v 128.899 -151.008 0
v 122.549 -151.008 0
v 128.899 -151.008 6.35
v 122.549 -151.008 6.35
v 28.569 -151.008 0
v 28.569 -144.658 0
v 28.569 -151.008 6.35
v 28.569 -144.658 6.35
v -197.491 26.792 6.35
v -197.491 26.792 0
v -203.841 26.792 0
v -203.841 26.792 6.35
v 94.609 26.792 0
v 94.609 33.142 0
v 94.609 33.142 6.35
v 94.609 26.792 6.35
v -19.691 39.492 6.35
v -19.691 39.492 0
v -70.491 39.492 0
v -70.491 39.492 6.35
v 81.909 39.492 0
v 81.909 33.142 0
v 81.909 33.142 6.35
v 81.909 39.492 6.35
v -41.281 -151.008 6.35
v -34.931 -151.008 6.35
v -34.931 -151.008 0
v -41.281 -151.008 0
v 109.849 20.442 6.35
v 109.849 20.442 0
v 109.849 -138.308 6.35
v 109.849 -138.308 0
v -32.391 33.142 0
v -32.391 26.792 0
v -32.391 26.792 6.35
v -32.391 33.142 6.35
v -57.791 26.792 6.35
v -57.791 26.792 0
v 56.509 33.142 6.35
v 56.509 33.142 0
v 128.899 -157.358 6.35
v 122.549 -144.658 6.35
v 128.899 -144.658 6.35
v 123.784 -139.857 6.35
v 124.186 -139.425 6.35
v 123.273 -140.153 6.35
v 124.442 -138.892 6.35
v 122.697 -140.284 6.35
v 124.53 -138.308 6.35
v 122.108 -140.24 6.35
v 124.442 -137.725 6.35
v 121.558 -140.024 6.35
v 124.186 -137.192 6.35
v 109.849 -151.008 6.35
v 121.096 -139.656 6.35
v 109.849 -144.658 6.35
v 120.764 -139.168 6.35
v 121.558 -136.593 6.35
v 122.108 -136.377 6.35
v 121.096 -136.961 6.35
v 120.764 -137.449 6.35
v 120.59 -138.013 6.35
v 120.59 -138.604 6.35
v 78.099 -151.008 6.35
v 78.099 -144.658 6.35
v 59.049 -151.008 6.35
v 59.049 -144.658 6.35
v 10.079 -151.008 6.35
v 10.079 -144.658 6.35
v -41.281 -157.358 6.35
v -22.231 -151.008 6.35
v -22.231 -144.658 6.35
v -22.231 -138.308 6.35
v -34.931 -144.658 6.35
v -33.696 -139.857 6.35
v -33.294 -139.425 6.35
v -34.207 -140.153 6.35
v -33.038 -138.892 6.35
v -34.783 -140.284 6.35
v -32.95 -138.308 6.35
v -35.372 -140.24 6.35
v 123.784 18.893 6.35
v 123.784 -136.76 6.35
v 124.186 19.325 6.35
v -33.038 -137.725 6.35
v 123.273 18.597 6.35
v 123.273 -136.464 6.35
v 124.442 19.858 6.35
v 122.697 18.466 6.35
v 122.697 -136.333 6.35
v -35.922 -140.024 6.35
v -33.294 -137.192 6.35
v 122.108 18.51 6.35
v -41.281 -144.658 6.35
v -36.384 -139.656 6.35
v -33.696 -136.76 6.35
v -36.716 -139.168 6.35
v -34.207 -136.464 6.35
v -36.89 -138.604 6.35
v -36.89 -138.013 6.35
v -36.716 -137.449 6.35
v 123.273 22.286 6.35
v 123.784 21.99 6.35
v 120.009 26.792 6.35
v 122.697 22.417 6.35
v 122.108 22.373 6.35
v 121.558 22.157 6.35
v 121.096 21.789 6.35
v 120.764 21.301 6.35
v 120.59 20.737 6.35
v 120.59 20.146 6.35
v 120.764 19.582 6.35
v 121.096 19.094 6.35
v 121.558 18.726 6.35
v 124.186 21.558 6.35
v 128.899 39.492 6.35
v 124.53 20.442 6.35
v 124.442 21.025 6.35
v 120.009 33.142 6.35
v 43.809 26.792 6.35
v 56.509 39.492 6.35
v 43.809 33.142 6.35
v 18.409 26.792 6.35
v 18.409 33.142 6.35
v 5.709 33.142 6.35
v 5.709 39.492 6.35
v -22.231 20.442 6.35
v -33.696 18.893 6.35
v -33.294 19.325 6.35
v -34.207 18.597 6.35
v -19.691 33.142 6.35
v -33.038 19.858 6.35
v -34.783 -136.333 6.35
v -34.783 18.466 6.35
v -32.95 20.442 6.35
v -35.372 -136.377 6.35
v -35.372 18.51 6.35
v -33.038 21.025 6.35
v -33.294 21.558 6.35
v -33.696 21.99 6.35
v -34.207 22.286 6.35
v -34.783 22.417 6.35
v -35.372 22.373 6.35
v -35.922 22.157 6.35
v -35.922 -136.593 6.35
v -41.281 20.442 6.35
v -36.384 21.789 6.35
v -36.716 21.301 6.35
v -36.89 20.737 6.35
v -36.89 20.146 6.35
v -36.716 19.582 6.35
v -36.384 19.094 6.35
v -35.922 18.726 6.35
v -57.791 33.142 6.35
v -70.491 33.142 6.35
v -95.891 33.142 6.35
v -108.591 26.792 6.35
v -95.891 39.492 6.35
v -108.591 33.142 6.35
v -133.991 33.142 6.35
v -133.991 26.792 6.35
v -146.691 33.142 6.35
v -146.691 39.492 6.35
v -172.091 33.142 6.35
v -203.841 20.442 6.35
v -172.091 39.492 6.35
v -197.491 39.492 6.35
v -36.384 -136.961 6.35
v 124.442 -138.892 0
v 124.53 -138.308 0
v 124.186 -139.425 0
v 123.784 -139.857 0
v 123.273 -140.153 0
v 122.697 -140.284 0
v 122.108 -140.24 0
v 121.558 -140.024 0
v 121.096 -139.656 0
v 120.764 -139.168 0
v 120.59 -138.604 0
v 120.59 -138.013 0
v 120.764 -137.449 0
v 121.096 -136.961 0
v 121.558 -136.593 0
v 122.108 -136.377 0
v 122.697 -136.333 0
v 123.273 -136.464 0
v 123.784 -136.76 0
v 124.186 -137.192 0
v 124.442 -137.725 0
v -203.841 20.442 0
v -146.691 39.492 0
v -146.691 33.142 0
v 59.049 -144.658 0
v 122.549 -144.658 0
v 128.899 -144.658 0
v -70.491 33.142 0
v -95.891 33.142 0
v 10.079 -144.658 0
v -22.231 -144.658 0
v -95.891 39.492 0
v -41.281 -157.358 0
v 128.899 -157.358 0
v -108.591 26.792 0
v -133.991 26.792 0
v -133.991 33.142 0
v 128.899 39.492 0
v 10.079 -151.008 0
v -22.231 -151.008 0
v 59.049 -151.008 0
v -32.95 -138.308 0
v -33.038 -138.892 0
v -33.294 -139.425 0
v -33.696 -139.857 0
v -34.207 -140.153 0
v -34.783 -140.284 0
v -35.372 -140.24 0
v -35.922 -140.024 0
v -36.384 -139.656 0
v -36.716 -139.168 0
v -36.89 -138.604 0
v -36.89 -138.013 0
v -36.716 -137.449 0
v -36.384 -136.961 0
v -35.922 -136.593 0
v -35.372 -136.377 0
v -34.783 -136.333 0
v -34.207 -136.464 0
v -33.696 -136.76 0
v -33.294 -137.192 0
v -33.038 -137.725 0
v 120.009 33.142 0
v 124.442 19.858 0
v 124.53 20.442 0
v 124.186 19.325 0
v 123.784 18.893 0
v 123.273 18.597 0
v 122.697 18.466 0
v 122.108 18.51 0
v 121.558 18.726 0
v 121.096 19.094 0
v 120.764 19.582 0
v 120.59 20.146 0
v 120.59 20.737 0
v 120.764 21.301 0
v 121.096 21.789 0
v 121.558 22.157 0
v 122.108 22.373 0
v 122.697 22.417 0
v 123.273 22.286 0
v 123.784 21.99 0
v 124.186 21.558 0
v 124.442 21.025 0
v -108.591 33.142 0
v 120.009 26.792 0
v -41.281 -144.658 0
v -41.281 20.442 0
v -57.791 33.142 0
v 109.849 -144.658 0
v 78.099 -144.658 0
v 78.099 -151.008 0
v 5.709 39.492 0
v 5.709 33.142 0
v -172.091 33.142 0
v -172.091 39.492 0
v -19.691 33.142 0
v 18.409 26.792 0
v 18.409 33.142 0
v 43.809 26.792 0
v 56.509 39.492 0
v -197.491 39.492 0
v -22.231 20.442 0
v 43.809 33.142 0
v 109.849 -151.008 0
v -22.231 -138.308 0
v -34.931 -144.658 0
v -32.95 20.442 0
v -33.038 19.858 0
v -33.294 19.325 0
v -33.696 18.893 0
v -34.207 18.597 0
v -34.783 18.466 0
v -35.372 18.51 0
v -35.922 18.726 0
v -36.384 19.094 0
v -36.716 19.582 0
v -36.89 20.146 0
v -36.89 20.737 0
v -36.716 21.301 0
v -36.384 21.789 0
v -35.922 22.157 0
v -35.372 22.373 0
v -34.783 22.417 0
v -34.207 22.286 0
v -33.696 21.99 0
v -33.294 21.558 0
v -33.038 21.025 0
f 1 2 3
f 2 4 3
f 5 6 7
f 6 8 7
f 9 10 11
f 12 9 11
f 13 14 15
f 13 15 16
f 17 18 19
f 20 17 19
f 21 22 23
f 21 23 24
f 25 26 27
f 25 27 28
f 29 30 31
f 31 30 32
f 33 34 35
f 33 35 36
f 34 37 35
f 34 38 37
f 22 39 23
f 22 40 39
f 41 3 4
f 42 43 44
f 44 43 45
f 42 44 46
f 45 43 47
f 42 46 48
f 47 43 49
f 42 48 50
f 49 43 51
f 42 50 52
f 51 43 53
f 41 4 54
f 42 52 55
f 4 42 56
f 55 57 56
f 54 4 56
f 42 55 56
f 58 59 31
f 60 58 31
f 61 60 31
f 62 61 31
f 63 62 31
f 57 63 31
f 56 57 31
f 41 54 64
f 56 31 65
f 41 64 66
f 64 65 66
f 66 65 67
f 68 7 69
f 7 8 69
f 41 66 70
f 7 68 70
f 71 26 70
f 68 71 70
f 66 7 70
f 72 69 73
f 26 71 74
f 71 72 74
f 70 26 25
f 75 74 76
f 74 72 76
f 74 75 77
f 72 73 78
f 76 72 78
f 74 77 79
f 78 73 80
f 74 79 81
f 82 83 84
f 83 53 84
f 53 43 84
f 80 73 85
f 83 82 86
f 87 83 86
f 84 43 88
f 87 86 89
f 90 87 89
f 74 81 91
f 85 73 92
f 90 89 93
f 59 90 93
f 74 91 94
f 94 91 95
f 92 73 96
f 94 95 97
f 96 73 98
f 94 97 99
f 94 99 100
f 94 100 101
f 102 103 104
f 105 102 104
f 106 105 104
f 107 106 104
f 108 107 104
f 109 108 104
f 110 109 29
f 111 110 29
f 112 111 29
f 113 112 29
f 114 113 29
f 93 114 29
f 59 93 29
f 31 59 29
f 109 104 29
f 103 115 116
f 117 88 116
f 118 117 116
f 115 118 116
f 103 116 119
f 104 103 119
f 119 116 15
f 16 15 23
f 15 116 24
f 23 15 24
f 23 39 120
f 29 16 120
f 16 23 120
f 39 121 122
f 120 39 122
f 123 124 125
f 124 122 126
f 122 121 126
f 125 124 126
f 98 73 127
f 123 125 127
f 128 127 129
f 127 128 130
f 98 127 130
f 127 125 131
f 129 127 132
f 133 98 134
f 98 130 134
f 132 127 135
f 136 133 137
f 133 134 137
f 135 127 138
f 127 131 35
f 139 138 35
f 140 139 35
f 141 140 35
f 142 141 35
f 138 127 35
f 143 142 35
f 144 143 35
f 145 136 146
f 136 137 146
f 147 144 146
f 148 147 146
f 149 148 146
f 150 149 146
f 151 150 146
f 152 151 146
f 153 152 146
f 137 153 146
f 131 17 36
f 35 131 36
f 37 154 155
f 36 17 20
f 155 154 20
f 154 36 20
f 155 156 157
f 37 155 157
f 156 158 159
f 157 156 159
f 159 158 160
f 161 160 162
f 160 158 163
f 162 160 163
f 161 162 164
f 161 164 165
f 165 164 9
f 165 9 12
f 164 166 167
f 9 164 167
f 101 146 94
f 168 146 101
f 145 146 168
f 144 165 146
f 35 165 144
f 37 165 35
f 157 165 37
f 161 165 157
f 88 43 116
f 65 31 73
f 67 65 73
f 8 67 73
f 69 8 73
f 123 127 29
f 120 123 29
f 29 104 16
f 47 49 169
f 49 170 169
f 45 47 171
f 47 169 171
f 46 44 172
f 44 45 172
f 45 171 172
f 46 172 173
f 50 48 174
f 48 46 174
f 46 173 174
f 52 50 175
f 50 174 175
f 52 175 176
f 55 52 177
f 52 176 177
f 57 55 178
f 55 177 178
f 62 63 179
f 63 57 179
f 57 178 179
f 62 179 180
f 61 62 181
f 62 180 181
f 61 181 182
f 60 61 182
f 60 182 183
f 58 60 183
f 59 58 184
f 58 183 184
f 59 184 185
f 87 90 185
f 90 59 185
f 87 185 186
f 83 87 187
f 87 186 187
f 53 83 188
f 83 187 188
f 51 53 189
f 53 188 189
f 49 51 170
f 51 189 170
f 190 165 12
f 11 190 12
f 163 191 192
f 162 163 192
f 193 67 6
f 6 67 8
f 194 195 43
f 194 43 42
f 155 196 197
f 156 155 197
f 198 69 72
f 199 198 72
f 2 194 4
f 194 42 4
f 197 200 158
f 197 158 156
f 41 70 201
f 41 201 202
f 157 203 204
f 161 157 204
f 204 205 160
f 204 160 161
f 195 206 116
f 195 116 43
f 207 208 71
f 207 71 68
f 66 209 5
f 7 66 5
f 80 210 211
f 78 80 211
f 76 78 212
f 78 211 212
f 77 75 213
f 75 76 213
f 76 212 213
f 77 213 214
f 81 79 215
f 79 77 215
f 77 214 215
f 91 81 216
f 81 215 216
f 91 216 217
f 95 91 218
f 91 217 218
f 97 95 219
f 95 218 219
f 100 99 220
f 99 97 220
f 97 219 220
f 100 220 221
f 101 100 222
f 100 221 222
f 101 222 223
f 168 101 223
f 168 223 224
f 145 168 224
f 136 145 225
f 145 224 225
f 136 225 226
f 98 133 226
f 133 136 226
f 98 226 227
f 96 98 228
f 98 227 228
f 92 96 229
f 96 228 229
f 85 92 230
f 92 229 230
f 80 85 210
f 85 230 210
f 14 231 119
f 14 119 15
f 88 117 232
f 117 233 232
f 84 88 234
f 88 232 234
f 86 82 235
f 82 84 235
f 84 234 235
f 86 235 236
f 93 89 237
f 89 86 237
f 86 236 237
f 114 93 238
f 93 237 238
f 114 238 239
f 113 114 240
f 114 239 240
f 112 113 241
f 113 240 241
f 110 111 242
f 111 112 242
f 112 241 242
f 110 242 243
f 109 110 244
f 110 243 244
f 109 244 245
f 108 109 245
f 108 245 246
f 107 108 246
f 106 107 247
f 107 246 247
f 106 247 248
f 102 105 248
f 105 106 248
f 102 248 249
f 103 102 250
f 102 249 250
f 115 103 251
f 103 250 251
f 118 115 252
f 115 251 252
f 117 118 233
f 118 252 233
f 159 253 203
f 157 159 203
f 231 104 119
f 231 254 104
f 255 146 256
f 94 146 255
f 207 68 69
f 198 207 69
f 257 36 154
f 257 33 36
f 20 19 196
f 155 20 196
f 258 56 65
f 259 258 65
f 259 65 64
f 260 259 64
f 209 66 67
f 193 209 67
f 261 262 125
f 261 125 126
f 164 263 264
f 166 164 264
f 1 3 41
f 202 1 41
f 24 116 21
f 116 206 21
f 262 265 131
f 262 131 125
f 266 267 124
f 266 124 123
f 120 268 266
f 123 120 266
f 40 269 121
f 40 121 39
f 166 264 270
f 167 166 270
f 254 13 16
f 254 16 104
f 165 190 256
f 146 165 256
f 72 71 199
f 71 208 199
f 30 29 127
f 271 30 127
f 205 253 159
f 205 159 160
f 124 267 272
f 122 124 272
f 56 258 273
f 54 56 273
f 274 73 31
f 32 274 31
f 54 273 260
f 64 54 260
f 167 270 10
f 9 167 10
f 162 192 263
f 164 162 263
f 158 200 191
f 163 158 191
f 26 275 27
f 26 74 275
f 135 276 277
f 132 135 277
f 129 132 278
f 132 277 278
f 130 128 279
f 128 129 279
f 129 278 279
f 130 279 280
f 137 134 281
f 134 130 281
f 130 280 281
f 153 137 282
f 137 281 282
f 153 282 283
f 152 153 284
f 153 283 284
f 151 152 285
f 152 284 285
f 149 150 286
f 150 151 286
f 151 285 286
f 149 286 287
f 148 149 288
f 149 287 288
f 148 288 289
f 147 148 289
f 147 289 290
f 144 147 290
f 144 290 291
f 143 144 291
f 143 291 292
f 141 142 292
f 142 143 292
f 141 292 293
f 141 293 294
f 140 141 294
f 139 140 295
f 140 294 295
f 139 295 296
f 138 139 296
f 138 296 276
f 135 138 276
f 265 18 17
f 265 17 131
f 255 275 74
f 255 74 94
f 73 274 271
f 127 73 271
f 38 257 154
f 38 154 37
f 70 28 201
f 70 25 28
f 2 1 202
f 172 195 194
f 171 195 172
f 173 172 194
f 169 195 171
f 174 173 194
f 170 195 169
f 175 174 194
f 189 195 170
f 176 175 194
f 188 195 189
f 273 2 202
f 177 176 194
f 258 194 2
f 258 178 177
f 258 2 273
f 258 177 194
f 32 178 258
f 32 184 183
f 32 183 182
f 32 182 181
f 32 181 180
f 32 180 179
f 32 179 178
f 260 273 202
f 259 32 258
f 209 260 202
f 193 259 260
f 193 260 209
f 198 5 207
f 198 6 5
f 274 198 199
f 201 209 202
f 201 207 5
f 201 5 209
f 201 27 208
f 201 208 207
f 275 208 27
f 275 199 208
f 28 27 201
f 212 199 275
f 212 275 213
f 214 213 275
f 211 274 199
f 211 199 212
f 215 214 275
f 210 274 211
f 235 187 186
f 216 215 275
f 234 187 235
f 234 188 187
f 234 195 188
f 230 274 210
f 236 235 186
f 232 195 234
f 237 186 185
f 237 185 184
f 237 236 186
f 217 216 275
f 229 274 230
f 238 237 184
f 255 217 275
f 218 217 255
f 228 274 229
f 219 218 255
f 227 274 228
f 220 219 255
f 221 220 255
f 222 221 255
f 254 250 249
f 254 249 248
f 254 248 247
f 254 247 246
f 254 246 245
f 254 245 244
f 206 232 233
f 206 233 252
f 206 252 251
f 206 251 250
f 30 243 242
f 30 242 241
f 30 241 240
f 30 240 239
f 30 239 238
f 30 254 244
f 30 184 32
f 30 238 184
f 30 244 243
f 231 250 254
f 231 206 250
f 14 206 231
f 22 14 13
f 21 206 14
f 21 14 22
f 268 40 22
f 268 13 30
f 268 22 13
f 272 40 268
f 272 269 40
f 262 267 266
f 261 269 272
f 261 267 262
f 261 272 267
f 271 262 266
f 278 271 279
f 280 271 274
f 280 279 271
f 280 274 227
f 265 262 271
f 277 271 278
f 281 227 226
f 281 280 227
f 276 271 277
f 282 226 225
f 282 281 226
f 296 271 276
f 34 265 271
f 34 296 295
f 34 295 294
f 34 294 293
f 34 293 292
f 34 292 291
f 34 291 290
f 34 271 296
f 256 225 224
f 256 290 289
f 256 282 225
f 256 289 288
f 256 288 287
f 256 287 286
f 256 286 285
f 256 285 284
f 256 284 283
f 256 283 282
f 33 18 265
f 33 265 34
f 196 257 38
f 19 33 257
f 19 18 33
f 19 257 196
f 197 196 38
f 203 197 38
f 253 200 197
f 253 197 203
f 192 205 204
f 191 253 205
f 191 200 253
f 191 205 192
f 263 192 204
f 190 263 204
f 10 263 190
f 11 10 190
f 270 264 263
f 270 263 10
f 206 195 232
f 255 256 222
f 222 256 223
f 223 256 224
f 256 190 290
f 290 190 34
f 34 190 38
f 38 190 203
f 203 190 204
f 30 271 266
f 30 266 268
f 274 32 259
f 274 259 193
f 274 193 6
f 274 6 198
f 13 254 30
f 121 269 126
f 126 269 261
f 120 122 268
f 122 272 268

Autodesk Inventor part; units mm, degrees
ref_plane "YZ Plane" through (0, 0, 0) normal (1, 0, 0) x (0, 1, 0)
ref_plane "XZ Plane" through (0, 0, 0) normal (0, 1, 0) x (-1, 0, 0)
ref_plane "XY Plane" through (0, 0, 0) normal (0, 0, 1) x (1, 0, 0)
sketch "Sketch1" plane through (0, 0, 0) normal (0, 0, 1) x (1, 0, 0)
  line L0 (-22.2313, 26.7915) -> (109.8487, 26.7915)
  line L1 (109.8487, 26.7915) -> (109.8487, -144.6585)
  line L2 (109.8487, -144.6585) -> (-22.2313, -144.6585)
  line L3 (-22.2313, -144.6585) -> (-22.2313, 26.7915)
  line L4 (-22.2313, 26.7915) -> (-28.5813, 26.7915)
  line L5 (-28.5813, 26.7915) -> (-28.5813, 39.4915)
  line L6 (-28.5813, 39.4915) -> (116.1987, 39.4915)
  line L7 (116.1987, 39.4915) -> (116.1987, 26.7915)
  line L8 (116.1987, 26.7915) -> (128.8987, 26.7915)
  line L9 (128.8987, 26.7915) -> (128.8987, 14.0915)
  line L10 (128.8987, 14.0915) -> (116.1987, 14.0915)
  line L11 (116.1987, 14.0915) -> (116.1987, -131.9585)
  line L12 (116.1987, -131.9585) -> (128.8987, -131.9585)
  line L13 (128.8987, -131.9585) -> (128.8987, -144.6585)
  line L14 (128.8987, -144.6585) -> (116.1987, -144.6585)
  line L15 (116.1987, -144.6585) -> (116.1987, -154.1835)
  line L16 (116.1987, -154.1835) -> (-28.5813, -154.1835)
  line L17 (-28.5813, -154.1835) -> (-28.5813, -144.6585)
  line L18 (-28.5813, -144.6585) -> (-41.2813, -144.6585)
  line L19 (-41.2813, -144.6585) -> (-41.2813, -131.9585)
  line L20 (-41.2813, -131.9585) -> (-28.5813, -131.9585)
  line L21 (-28.5813, -131.9585) -> (-28.5813, 14.0915)
  line L22 (-28.5813, 14.0915) -> (-41.2813, 14.0915)
  line L23 (-41.2813, 14.0915) -> (-41.2813, 26.7915)
  line L24 (-41.2813, 26.7915) -> (-28.5813, 26.7915)
  line L25 (-22.2313, -144.6585) -> (-22.2313, -151.0085)
  line L26 (-22.2313, -151.0085) -> (15.8687, -151.0085)
  line L27 (15.8687, -151.0085) -> (15.8687, -144.6585)
  line L28 (15.8687, -144.6585) -> (22.2187, -144.6585)
  line L29 (22.2187, -144.6585) -> (22.2187, -151.0085)
  line L30 (109.8487, -144.6585) -> (109.8487, -151.0085)
  line L31 (109.8487, -151.0085) -> (71.7487, -151.0085)
  line L32 (71.7487, -151.0085) -> (71.7487, -144.6585)
  line L33 (71.7487, -144.6585) -> (65.3987, -144.6585)
  line L34 (65.3987, -144.6585) -> (65.3987, -151.0085)
  line L35 (65.3987, -151.0085) -> (22.2187, -151.0085)
  line L36 (-22.2313, 26.7915) -> (-22.2313, 33.1415)
  line L37 (-22.2313, 33.1415) -> (15.8687, 33.1415)
  line L38 (15.8687, 33.1415) -> (15.8687, 26.7915)
  line L39 (22.2187, 26.7915) -> (22.2187, 33.1415)
  line L40 (22.2187, 33.1415) -> (65.3987, 33.1415)
  line L41 (65.3987, 33.1415) -> (65.3987, 26.7915)
  line L42 (71.7487, 26.7915) -> (71.7487, 33.1415)
  line L43 (71.7487, 33.1415) -> (109.8487, 33.1415)
  line L44 (109.8487, 33.1415) -> (109.8487, 26.7915)
  circle A0 centre (-34.9313, 20.4415) radius 1.9812
  circle A1 centre (122.5487, 20.4415) radius 1.9812
  circle A2 centre (122.5487, -138.3085) radius 1.9812
  circle A3 centre (-34.9313, -138.3085) radius 1.9812
  point P0 (0, 0)
  dimension "d0" = 132.08
  dimension "d1" = 171.45
  dimension "d2" = 6.35
  dimension "d3" = 12.7
  dimension "d4" = 144.78
  dimension "d5" = 12.7
  dimension "d6" = 12.7
  dimension "d7" = 146.05
  dimension "d8" = 9.525
  dimension "d9" = 12.7
  dimension "d10" = 6.35
  dimension "d11" = 38.1
  dimension "d12" = 6.35
  dimension "d13" = 38.1
  dimension "d14" = 6.35
  dimension "d15" = 3.9624
  dimension "d16" = 3.9624
extrude "Extrusion1" add sketch "Sketch1" along normal blind 6.35
sketch "Sketch2" plane through (-28.5813, -154.1835, 0) normal (0, -1, 0) x (1, 0, 0)
  line L0 (144.78, 6.35) -> (0, 6.35) projected
  line L1 (0, 0) -> (0, 6.35) projected
  line L2 (0, 0) -> (144.78, 0) projected
  line L3 (144.78, 0) -> (144.78, 6.35) projected
  point P0 (28.5813, 0)
extrude "Extrusion2" add sketch "Sketch2" along normal blind 3.175
sketch "Sketch3" plane through (0, 0, 6.35) normal (0, 0, 1) x (1, 0, 0)
  line L0 (-28.5813, 14.0915) -> (-41.2813, 14.0915) projected
  line L1 (-28.5813, -131.9585) -> (-28.5813, 14.0915) projected
  line L2 (-41.2813, -131.9585) -> (-28.5813, -131.9585) projected
  line L3 (116.1987, -131.9585) -> (128.8987, -131.9585) projected
  line L4 (116.1987, 14.0915) -> (116.1987, -131.9585) projected
  line L5 (128.8987, 14.0915) -> (116.1987, 14.0915) projected
  line L6 (71.7487, 33.1415) -> (109.8487, 33.1415) projected
  line L7 (-41.2813, 14.0915) -> (-41.2813, -131.9585)
  line L8 (128.8987, 14.0915) -> (128.8987, -131.9585)
  point P0 (0, 0)
extrude "Extrusion3" add sketch "Sketch3" against normal blind 6.35
sketch "Sketch4" plane through (0, 0, 6.35) normal (0, 0, 1) x (1, 0, 0)
  line L0 (-28.5813, -157.3585) -> (-28.5813, -144.6585) projected
  line L1 (-28.5813, -157.3585) -> (116.1987, -157.3585) projected
  line L2 (116.1987, -144.6585) -> (116.1987, -157.3585) projected
  line L3 (109.8487, 33.1415) -> (109.8487, -151.0085) projected
  line L4 (-22.2313, -151.0085) -> (-22.2313, 33.1415) projected
  line L5 (15.8687, 26.7915) -> (22.2187, 26.7915) projected
  line L6 (71.7487, 33.1415) -> (109.8487, 33.1415) projected
  line L7 (15.8687, 26.7915) -> (-22.2313, 26.7915)
  line L8 (22.2187, 26.7915) -> (109.8487, 26.7915)
  line L9 (109.8487, 26.7915) -> (109.8487, 20.4415)
  line L10 (109.8487, 20.4415) -> (-22.2313, 20.4415)
  line L11 (-22.2313, 20.4415) -> (-22.2313, 26.7915)
  line L12 (-22.2313, -144.6585) -> (-22.2313, -138.3085)
  line L13 (-22.2313, -138.3085) -> (109.8487, -138.3085)
  line L14 (109.8487, -144.6585) -> (-22.2313, -144.6585)
  line L15 (-28.5813, -151.0085) -> (-41.2813, -151.0085)
  line L16 (-41.2813, -151.0085) -> (-41.2813, -157.3585)
  line L17 (-41.2813, -157.3585) -> (-28.5813, -157.3585)
  line L18 (116.1987, -151.0085) -> (128.8987, -151.0085)
  line L19 (128.8987, -151.0085) -> (128.8987, -157.3585)
  line L20 (128.8987, -157.3585) -> (116.1987, -157.3585)
  point P0 (0, 0)
extrude "Extrusion4" add sketch "Sketch4" against normal blind 6.35 contours L17 L16 L15 L0 | L2 L18 L19 L20 | L3 L10 L4 L7 L5 L8 | L3 L14 L4 L13
sketch "Sketch5" plane through (0, 0, 6.35) normal (0, 0, 1) x (1, 0, 0)
  line L0 (-28.5813, 26.7915) -> (-28.5813, 39.4915) projected
  line L1 (116.1987, 39.4915) -> (116.1987, 26.7915) projected
  line L2 (15.8687, 33.1415) -> (15.8687, 26.7915) projected
  line L3 (-28.5813, 39.4915) -> (-41.2813, 39.4915)
  line L4 (-41.2813, 39.4915) -> (-41.2813, 33.1415)
  line L5 (-41.2813, 33.1415) -> (-28.5813, 33.1415)
  line L6 (116.1987, 39.4915) -> (128.8987, 39.4915)
  line L7 (128.8987, 39.4915) -> (128.8987, 33.1415)
  line L8 (128.8987, 33.1415) -> (116.1987, 33.1415)
  point P0 (0, 0)
extrude "Extrusion5" add sketch "Sketch5" against normal blind 6.35
sketch "Sketch6" plane through (0, 0, 6.35) normal (0, 0, 1) x (1, 0, 0)
  line L0 (65.3987, -151.0085) -> (22.2187, -151.0085) projected
  line L1 (22.2187, -144.6585) -> (65.3987, -144.6585) projected
  line L2 (-22.2313, -144.6585) -> (15.8687, -144.6585) projected
  line L3 (109.8487, -151.0085) -> (71.7487, -151.0085) projected
  line L4 (65.3987, 26.7915) -> (22.2187, 26.7915) projected
  line L5 (109.8487, 26.7915) -> (71.7487, 26.7915) projected
  line L6 (-41.2813, 26.7915) -> (-28.5813, 26.7915) projected
  line L7 (-28.5813, -151.0085) -> (-41.2813, -151.0085) projected
  line L8 (128.8987, -151.0085) -> (116.1987, -151.0085) projected
  line L9 (116.1987, 26.7915) -> (128.8987, 26.7915) projected
  line L10 (-28.5813, 33.1415) -> (-34.9313, 33.1415)
  line L11 (-34.9313, 33.1415) -> (-34.9313, 26.7915)
  line L12 (-34.9313, 26.7915) -> (-28.5813, 26.7915)
  line L13 (-28.5813, 26.7915) -> (-28.5813, 33.1415)
  line L14 (15.8687, 33.1415) -> (10.0792, 33.1415)
  line L15 (10.0792, 33.1415) -> (10.0792, 26.7915)
  line L16 (10.0792, 26.7915) -> (15.8687, 26.7915)
  line L17 (15.8687, 26.7915) -> (15.8687, 33.1415)
  line L18 (22.2187, 33.1415) -> (28.5687, 33.1415)
  line L19 (28.5687, 33.1415) -> (28.5687, 26.7915)
  line L20 (28.5687, 26.7915) -> (22.2187, 26.7915)
  line L21 (22.2187, 26.7915) -> (22.2187, 33.1415)
  line L22 (65.3987, 33.1415) -> (59.0487, 33.1415)
  line L23 (59.0487, 33.1415) -> (59.0487, 26.7915)
  line L24 (59.0487, 26.7915) -> (65.3987, 26.7915)
  line L25 (65.3987, 26.7915) -> (65.3987, 33.1415)
  line L26 (71.7487, 33.1415) -> (78.0987, 33.1415)
  line L27 (78.0987, 33.1415) -> (78.0987, 26.7915)
  line L28 (78.0987, 26.7915) -> (71.7487, 26.7915)
  line L29 (71.7487, 26.7915) -> (71.7487, 33.1415)
  line L30 (116.1987, 33.1415) -> (122.5487, 33.1415)
  line L31 (122.5487, 33.1415) -> (122.5487, 26.7915)
  line L32 (122.5487, 26.7915) -> (116.1987, 26.7915)
  line L33 (116.1987, 26.7915) -> (116.1987, 33.1415)
  line L34 (-28.5813, -144.6585) -> (-34.9313, -144.6585)
  line L35 (-34.9313, -144.6585) -> (-34.9313, -151.0085)
  line L36 (-34.9313, -151.0085) -> (-28.5813, -151.0085)
  line L37 (-28.5813, -151.0085) -> (-28.5813, -144.6585)
  line L38 (10.0792, -144.6585) -> (28.5687, -144.6585)
  line L39 (28.5687, -144.6585) -> (28.5687, -151.0085)
  line L40 (28.5687, -151.0085) -> (10.0792, -151.0085)
  line L41 (10.0792, -151.0085) -> (10.0792, -144.6585)
  line L42 (59.0487, -144.6585) -> (78.0987, -144.6585)
  line L43 (78.0987, -144.6585) -> (78.0987, -151.0085)
  line L44 (78.0987, -151.0085) -> (59.0487, -151.0085)
  line L45 (59.0487, -151.0085) -> (59.0487, -144.6585)
  line L46 (116.1987, -144.6585) -> (122.5487, -144.6585)
  line L47 (122.5487, -144.6585) -> (122.5487, -151.0085)
  line L48 (122.5487, -151.0085) -> (116.1987, -151.0085)
  line L49 (116.1987, -151.0085) -> (116.1987, -144.6585)
  point P0 (0, 0)
  dimension "d27" = 6.35
  dimension "d28" = 6.35
  dimension "d29" = 6.35
  dimension "d30" = 6.35
  dimension "d31" = 6.35
extrude "Extrusion6" add sketch "Sketch6" against normal blind 6.35 contours L0 L45 L1 L42 L43 L3 L44 | L0 L40 L41 L2 L38 L1 L39 | L4 L21 L18 L19 | L4 L23 L22 L25 | L5 L29 L26 L27 | L11 L10 L13 L6 | L7 L35 L34 L37 | L8 L49 L46 L47 | L33 L30 L31 L9 | L17 L16 L15 L14
sketch "Sketch7" plane through (0, 0, 0) normal (0, 0, -1) x (-1, 0, 0)
  line L0 (-128.8987, 39.4915) -> (-90.7987, 39.4915)
  line L1 (-90.7987, 39.4915) -> (-90.7987, 115.6915)
  line L2 (-90.7987, 115.6915) -> (-128.8987, 115.6915)
  line L3 (-128.8987, 115.6915) -> (-128.8987, 39.4915)
  line L4 (-90.7987, 39.4915) -> (41.2813, 39.4915)
  line L5 (41.2813, 39.4915) -> (41.2813, 64.8915)
  line L6 (41.2813, 64.8915) -> (-90.7987, 64.8915)
  line L7 (-90.7987, 64.8915) -> (-90.7987, 39.4915)
  point P0 (0, 0)
  dimension "d34" = 38.1
  dimension "d35" = 76.2
  dimension "d36" = 25.4
extrude "Extrusion7" add sketch "Sketch7" against normal blind 6.35
sketch "Sketch8" plane through (0, 0, 0) normal (0, 0, -1) x (-1, 0, 0)
  line L0 (41.2813, 64.8915) -> (210.1913, 64.8915)
  line L1 (210.1913, 64.8915) -> (210.1913, 39.4915)
  line L2 (210.1913, 39.4915) -> (41.2813, 39.4915)
  line L3 (41.2813, 39.4915) -> (41.2813, 64.8915)
  line L4 (210.1913, 64.8915) -> (172.0913, 64.8915)
  line L5 (172.0913, 64.8915) -> (172.0913, 115.6915)
  line L6 (172.0913, 115.6915) -> (210.1913, 115.6915)
  line L7 (210.1913, 115.6915) -> (210.1913, 64.8915)
  point P0 (0, 0)
  dimension "d39" = 168.91
  dimension "d40" = 25.4
  dimension "d41" = 38.1
extrude "Extrusion8" add sketch "Sketch8" against normal blind 6.35
sketch "Sketch9" plane through (0, 0, 0) normal (0, 0, -1) x (-1, 0, 0)
  line L0 (-109.8487, 26.7915) -> (-109.8487, 33.1415) projected
  line L1 (-109.8487, 33.1415) -> (-78.0987, 33.1415) projected
  line L2 (-78.0987, 26.7915) -> (-78.0987, 33.1415) projected
  line L3 (-109.8487, 26.7915) -> (-78.0987, 26.7915) projected
  line L4 (-10.0792, 33.1415) -> (-10.0792, 26.7915) projected
  line L5 (-10.0792, 33.1415) -> (22.2313, 33.1415) projected
  line L6 (22.2313, 33.1415) -> (22.2313, 26.7915) projected
  line L7 (-10.0792, 26.7915) -> (22.2313, 26.7915) projected
  line L8 (-59.0487, 33.1415) -> (-28.5687, 33.1415) projected
  line L9 (-28.5687, 26.7915) -> (-28.5687, 33.1415) projected
  line L10 (-59.0487, 26.7915) -> (-28.5687, 26.7915) projected
  line L11 (-59.0487, 33.1415) -> (-59.0487, 26.7915) projected
  line L12 (-128.8987, 115.6915) -> (-128.8987, 33.1415) projected
  line L13 (-128.8987, 49.764) -> (41.2813, 49.764)
  line L14 (41.2813, 49.764) -> (41.2813, 26.7915)
  line L15 (41.2813, 26.7915) -> (-128.8987, 26.7915)
  line L16 (-128.8987, 26.7915) -> (-128.8987, 49.764)
  point P0 (0, 0)
extrude "Extrusion9" add sketch "Sketch9" against normal blind 6.35
sketch "Sketch10" plane through (0, 0, 0) normal (0, 0, -1) x (-1, 0, 0)
  line L0 (41.2813, 39.4915) -> (210.1913, 39.4915)
  line L1 (210.1913, 39.4915) -> (210.1913, 20.4415)
  line L2 (210.1913, 20.4415) -> (41.2813, 20.4415)
  line L3 (41.2813, 20.4415) -> (41.2813, 39.4915)
  point P0 (0, 0)
extrude "Extrusion10" add sketch "Sketch10" against normal blind 6.35
sketch "Sketch11" plane through (0, 0, 0) normal (0, 0, -1) x (-1, 0, 0)
  line L0 (-128.8987, 115.6915) -> (-90.7987, 115.6915)
  line L1 (-90.7987, 115.6915) -> (-90.7987, 141.0915)
  line L2 (-90.7987, 141.0915) -> (-128.8987, 141.0915)
  line L3 (-128.8987, 141.0915) -> (-128.8987, 115.6915)
  line L4 (172.0913, 115.6915) -> (210.1913, 115.6915)
  line L5 (210.1913, 115.6915) -> (210.1913, 141.0915)
  line L6 (210.1913, 141.0915) -> (172.0913, 141.0915)
  line L7 (172.0913, 141.0915) -> (172.0913, 115.6915)
  point P0 (0, 0)
  dimension "d48" = 25.4
extrude "Extrusion11" add sketch "Sketch11" against normal blind 6.35
sketch "Sketch12" plane through (0, 0, 0) normal (0, 0, -1) x (-1, 0, 0)
  line L0 (210.1913, 20.4415) -> (172.0913, 20.4415)
  line L1 (172.0913, 20.4415) -> (172.0913, 26.7915)
  line L2 (172.0913, 26.7915) -> (210.1913, 26.7915)
  line L3 (210.1913, 26.7915) -> (210.1913, 20.4415)
  line L4 (172.0913, 26.7915) -> (146.6913, 26.7915)
  line L5 (146.6913, 26.7915) -> (146.6913, 33.1415)
  line L6 (146.6913, 33.1415) -> (172.0913, 33.1415)
  line L7 (172.0913, 33.1415) -> (172.0913, 26.7915)
  line L8 (146.6913, 33.1415) -> (172.0913, 33.1415)
  line L9 (172.0913, 33.1415) -> (172.0913, 39.4915)
  line L10 (172.0913, 39.4915) -> (146.6913, 39.4915)
  line L11 (146.6913, 39.4915) -> (146.6913, 33.1415)
  line L12 (146.6913, 39.4915) -> (95.8913, 39.4915)
  line L13 (95.8913, 39.4915) -> (95.8913, 33.1415)
  line L14 (95.8913, 33.1415) -> (146.6913, 33.1415)
  line L15 (146.6913, 33.1415) -> (146.6913, 39.4915)
  line L16 (95.8913, 39.4915) -> (70.4913, 39.4915)
  line L17 (70.4913, 39.4915) -> (70.4913, 33.1415)
  line L18 (70.4913, 33.1415) -> (95.8913, 33.1415)
  line L19 (95.8913, 33.1415) -> (95.8913, 39.4915)
  line L20 (146.6913, 33.1415) -> (133.9913, 33.1415)
  line L21 (133.9913, 33.1415) -> (133.9913, 26.7915)
  line L22 (133.9913, 26.7915) -> (146.6913, 26.7915)
  line L23 (146.6913, 26.7915) -> (146.6913, 33.1415)
  line L24 (133.9913, 33.1415) -> (108.5913, 33.1415)
  line L25 (108.5913, 33.1415) -> (108.5913, 26.7915)
  line L26 (108.5913, 26.7915) -> (133.9913, 26.7915)
  line L27 (133.9913, 26.7915) -> (133.9913, 33.1415)
  line L28 (70.4913, 33.1415) -> (57.7913, 33.1415)
  line L29 (57.7913, 33.1415) -> (57.7913, 26.7915)
  line L30 (57.7913, 26.7915) -> (70.4913, 26.7915)
  line L31 (70.4913, 26.7915) -> (70.4913, 33.1415)
  line L32 (57.7913, 26.7915) -> (32.3913, 26.7915)
  line L33 (32.3913, 26.7915) -> (32.3913, 33.1415)
  line L34 (32.3913, 33.1415) -> (57.7913, 33.1415)
  line L35 (57.7913, 33.1415) -> (57.7913, 26.7915)
  line L36 (32.3913, 33.1415) -> (19.6913, 33.1415)
  line L37 (19.6913, 33.1415) -> (19.6913, 26.7915)
  line L38 (19.6913, 26.7915) -> (32.3913, 26.7915)
  line L39 (32.3913, 26.7915) -> (32.3913, 33.1415)
  line L40 (19.6913, 33.1415) -> (-5.7087, 33.1415)
  line L41 (-5.7087, 33.1415) -> (-5.7087, 39.4915)
  line L42 (-5.7087, 39.4915) -> (19.6913, 39.4915)
  line L43 (19.6913, 39.4915) -> (19.6913, 33.1415)
  line L44 (-5.7087, 33.1415) -> (-18.4087, 33.1415)
  line L45 (-18.4087, 33.1415) -> (-18.4087, 26.7915)
  line L46 (-18.4087, 26.7915) -> (-5.7087, 26.7915)
  line L47 (-5.7087, 26.7915) -> (-5.7087, 33.1415)
  line L48 (-18.4087, 33.1415) -> (-43.8087, 33.1415)
  line L49 (-43.8087, 33.1415) -> (-43.8087, 26.7915)
  line L50 (-43.8087, 26.7915) -> (-18.4087, 26.7915)
  line L51 (-18.4087, 26.7915) -> (-18.4087, 33.1415)
  line L52 (-43.8087, 33.1415) -> (-56.5087, 33.1415)
  line L53 (-56.5087, 33.1415) -> (-56.5087, 26.7915)
  line L54 (-56.5087, 26.7915) -> (-43.8087, 26.7915)
  line L55 (-43.8087, 26.7915) -> (-43.8087, 33.1415)
  line L56 (-56.5087, 33.1415) -> (-81.9087, 33.1415)
  line L57 (-81.9087, 33.1415) -> (-81.9087, 38.8107)
  line L58 (-81.9087, 38.8107) -> (-56.5087, 38.8107)
  line L59 (-56.5087, 38.8107) -> (-56.5087, 33.1415)
  line L60 (-81.9087, 33.1415) -> (-94.6087, 33.1415)
  line L61 (-94.6087, 33.1415) -> (-94.6087, 26.7915)
  line L62 (-94.6087, 26.7915) -> (-81.9087, 26.7915)
  line L63 (-81.9087, 26.7915) -> (-81.9087, 33.1415)
  line L64 (-94.6087, 26.7915) -> (-120.0087, 26.7915)
  line L65 (-120.0087, 26.7915) -> (-120.0087, 33.1415)
  line L66 (-120.0087, 33.1415) -> (-94.6087, 33.1415)
  line L67 (-94.6087, 33.1415) -> (-94.6087, 26.7915)
  point P0 (0, 0)
  dimension "d51" = 6.35
  dimension "d52" = 25.4
  dimension "d53" = 6.35
  dimension "d54" = 25.4
  dimension "d55" = 6.35
  dimension "d56" = 50.8
  dimension "d57" = 25.4
  dimension "d58" = 12.7
  dimension "d59" = 25.4
  dimension "d60" = 12.7
  dimension "d61" = 25.4
  dimension "d62" = 12.7
  dimension "d63" = 25.4
  dimension "d64" = 12.7
  dimension "d65" = 25.4
  dimension "d66" = 12.7
  dimension "d67" = 25.4
  dimension "d68" = 12.7
  dimension "d69" = 25.4
extrude "Extrusion12" cut sketch "Sketch12" against normal blind 6.35 contours L56 L57 L58 L59 | L40 L41 L42 L43 | L6 L11 L10 L9 | L26 L25 L14 L21 | L13 L18 L17 L16 | L29 L32 L33 L34 | L45 L50 L49 L48 | L61 L64 L65 L66
sketch "Sketch13" plane through (0, 0, 0) normal (0, 0, -1) x (-1, 0, 0)
  line L0 (210.1913, 20.4415) -> (210.1913, 141.0915) projected
  line L1 (210.1913, 20.4415) -> (203.8413, 20.4415)
  line L2 (203.8413, 20.4415) -> (203.8413, 64.8915)
  line L3 (203.8413, 64.8915) -> (210.1913, 64.8915)
  line L4 (210.1913, 64.8915) -> (210.1913, 20.4415)
  line L5 (203.8413, 64.8915) -> (210.1913, 64.8915)
  line L6 (210.1913, 64.8915) -> (210.1913, 90.2915)
  line L7 (210.1913, 90.2915) -> (203.8413, 90.2915)
  line L8 (203.8413, 90.2915) -> (203.8413, 64.8915)
  line L9 (203.8413, 90.2915) -> (210.1913, 90.2915)
  line L10 (210.1913, 90.2915) -> (210.1913, 115.6915)
  line L11 (210.1913, 115.6915) -> (203.8413, 115.6915)
  line L12 (203.8413, 115.6915) -> (203.8413, 90.2915)
  point P0 (0, 0)
  dimension "d72" = 6.35
  dimension "d73" = 25.4
  dimension "d74" = 25.4
extrude "Extrusion13" cut sketch "Sketch13" against normal blind 6.35 contours L1 L2 L3 L0 | L7 L12 L11 L0
sketch "Sketch14" plane through (0, 0, 0) normal (0, 0, -1) x (-1, 0, 0)
  line L0 (-90.7987, 64.8915) -> (-90.7987, 141.0915) projected
  line L1 (-128.8987, -144.6585) -> (-128.8987, 141.0915) projected
  line L2 (-128.8987, 141.0915) -> (-90.7987, 141.0915)
  line L3 (-90.7987, 141.0915) -> (-90.7987, 115.6915)
  line L4 (-90.7987, 115.6915) -> (-128.8987, 115.6915)
  line L5 (-128.8987, 115.6915) -> (-128.8987, 141.0915)
  line L6 (172.0913, 141.0915) -> (210.1913, 141.0915)
  line L7 (210.1913, 141.0915) -> (210.1913, 115.6915)
  line L8 (210.1913, 115.6915) -> (172.0913, 115.6915)
  line L9 (172.0913, 115.6915) -> (172.0913, 141.0915)
  line L10 (-128.8987, 90.2915) -> (-122.5487, 90.2915)
  line L11 (-122.5487, 90.2915) -> (-122.5487, 64.8915)
  line L12 (-122.5487, 64.8915) -> (-128.8987, 64.8915)
  line L13 (-128.8987, 64.8915) -> (-128.8987, 90.2915)
  point P0 (0, 0)
extrude "Extrusion14" cut sketch "Sketch14" against normal blind 6.35
sketch "Sketch15" plane through (0, 0, 0) normal (0, 0, -1) x (-1, 0, 0)
  line L0 (203.8413, 20.4415) -> (203.8413, 64.8915) projected
  line L1 (203.8413, 39.4915) -> (197.4913, 39.4915)
  line L2 (197.4913, 39.4915) -> (197.4913, 26.7915)
  line L3 (197.4913, 26.7915) -> (203.8413, 26.7915)
  line L4 (203.8413, 26.7915) -> (203.8413, 39.4915)
  point P0 (0, 0)
  dimension "d79" = 6.35
extrude "Extrusion15" cut sketch "Sketch15" against normal blind 6.35
sketch "Sketch16" plane through (0, 0, 0) normal (0, 0, -1) x (-1, 0, 0)
  line L0 (-128.8987, 90.2915) -> (-109.8487, 90.2915)
  line L1 (-109.8487, 90.2915) -> (-109.8487, 77.5915)
  line L2 (-109.8487, 77.5915) -> (-128.8987, 77.5915)
  line L3 (-128.8987, 77.5915) -> (-128.8987, 90.2915)
  line L4 (172.0913, 115.6915) -> (191.1413, 115.6915)
  line L5 (191.1413, 115.6915) -> (191.1413, 83.9415)
  line L6 (191.1413, 83.9415) -> (172.0913, 83.9415)
  line L7 (172.0913, 83.9415) -> (172.0913, 115.6915)
  circle A0 centre (-109.8487, 77.5915) radius 1.9812
  circle A1 centre (191.1413, 83.9415) radius 1.9812
  point P0 (0, 0)
  dimension "d82" = 19.05
  dimension "d83" = 3.9624
  dimension "d84" = 3.9624
extrude "Extrusion16" cut sketch "Sketch16" against normal blind 6.35 contours A0 L2 L1 | L1 L2 A0 | A1 L6 L5 | L5 L6 A1
sketch "Sketch17" plane through (0, 0, 0) normal (0, 0, -1) x (-1, 0, 0)
  line L0 (-122.5487, 90.2915) -> (-128.8987, 90.2915)
  line L1 (-128.8987, 90.2915) -> (-128.8987, 64.8915)
  line L2 (-128.8987, 64.8915) -> (-122.5487, 64.8915)
  line L3 (-122.5487, 64.8915) -> (-122.5487, 90.2915)
  point P0 (0, 0)
extrude "Extrusion17" add sketch "Sketch17" against normal blind 6.35
sketch "Sketch18" plane through (0, 0, 0) normal (0, 0, -1) x (-1, 0, 0)
  line L0 (-128.8987, -144.6585) -> (-128.8987, 115.6915) projected
  line L1 (-128.8987, 115.6915) -> (-122.5487, 115.6915)
  line L2 (-122.5487, 115.6915) -> (-122.5487, 90.2915)
  line L3 (-122.5487, 90.2915) -> (-128.8987, 90.2915)
  line L4 (-128.8987, 90.2915) -> (-128.8987, 115.6915)
  line L5 (-128.8987, 90.2915) -> (-122.5487, 90.2915)
  line L6 (-122.5487, 90.2915) -> (-122.5487, 64.8915)
  line L7 (-122.5487, 64.8915) -> (-128.8987, 64.8915)
  line L8 (-128.8987, 64.8915) -> (-128.8987, 90.2915)
  line L9 (-122.5487, 64.8915) -> (-128.8987, 64.8915)
  line L10 (-128.8987, 64.8915) -> (-128.8987, 39.4915)
  line L11 (-128.8987, 39.4915) -> (-122.5487, 39.4915)
  line L12 (-122.5487, 39.4915) -> (-122.5487, 64.8915)
  point P0 (0, 0)
  dimension "d89" = 25.4
  dimension "d90" = 25.4
  dimension "d91" = 25.4
extrude "Extrusion18" cut sketch "Sketch18" against normal blind 6.35 contours L0 L7 L12 L11 | L0 L1 L2 L3
sketch "Sketch19" plane through (0, 0, 0) normal (0, 0, -1) x (-1, 0, 0)
  line L0 (-122.5487, 90.2915) -> (-128.8987, 90.2915) projected
  line L1 (-128.8987, 64.8915) -> (-128.8987, 90.2915) projected
  line L2 (-128.8987, 64.8915) -> (-122.5487, 64.8915) projected
  line L3 (-122.5487, 64.8915) -> (-122.5487, 39.4915) projected
  line L4 (197.4913, 39.4915) -> (203.8413, 39.4915) projected
  line L5 (203.8413, 39.4915) -> (203.8413, 64.8915) projected
  line L6 (203.8413, 64.8915) -> (210.1913, 64.8915) projected
  line L7 (210.1913, 64.8915) -> (210.1913, 90.2915) projected
  line L8 (210.1913, 90.2915) -> (203.8413, 90.2915) projected
  line L9 (203.8413, 90.2915) -> (203.8413, 115.6915) projected
  line L10 (203.8413, 115.6915) -> (172.0913, 115.6915) projected
  line L11 (172.0913, 115.6915) -> (172.0913, 64.8915) projected
  line L12 (172.0913, 64.8915) -> (-90.7987, 64.8915) projected
  line L13 (-90.7987, 64.8915) -> (-90.7987, 115.6915) projected
  line L14 (-90.7987, 115.6915) -> (-122.5487, 115.6915) projected
  line L15 (-122.5487, 115.6915) -> (-122.5487, 90.2915) projected
  circle A0 centre (191.1413, 83.9415) radius 1.9812 projected
  circle A1 centre (-109.8487, 77.5915) radius 1.9812 projected
  line L16 (-81.9087, 38.8107) -> (-56.5087, 38.8107) projected
  line L17 (22.2313, 20.4415) -> (22.2313, -138.3085) projected
  line L18 (-122.5487, 39.4915) -> (197.4913, 39.4915)
  line L19 (-81.9087, 38.8107) -> (-81.9087, 39.4915)
  line L20 (-56.5087, 38.8107) -> (-56.5087, 39.4915)
  point P0 (0, 0)
extrude "Extrusion19" cut sketch "Sketch19" against normal blind 25.4
properties part number "top-bot connector side"
